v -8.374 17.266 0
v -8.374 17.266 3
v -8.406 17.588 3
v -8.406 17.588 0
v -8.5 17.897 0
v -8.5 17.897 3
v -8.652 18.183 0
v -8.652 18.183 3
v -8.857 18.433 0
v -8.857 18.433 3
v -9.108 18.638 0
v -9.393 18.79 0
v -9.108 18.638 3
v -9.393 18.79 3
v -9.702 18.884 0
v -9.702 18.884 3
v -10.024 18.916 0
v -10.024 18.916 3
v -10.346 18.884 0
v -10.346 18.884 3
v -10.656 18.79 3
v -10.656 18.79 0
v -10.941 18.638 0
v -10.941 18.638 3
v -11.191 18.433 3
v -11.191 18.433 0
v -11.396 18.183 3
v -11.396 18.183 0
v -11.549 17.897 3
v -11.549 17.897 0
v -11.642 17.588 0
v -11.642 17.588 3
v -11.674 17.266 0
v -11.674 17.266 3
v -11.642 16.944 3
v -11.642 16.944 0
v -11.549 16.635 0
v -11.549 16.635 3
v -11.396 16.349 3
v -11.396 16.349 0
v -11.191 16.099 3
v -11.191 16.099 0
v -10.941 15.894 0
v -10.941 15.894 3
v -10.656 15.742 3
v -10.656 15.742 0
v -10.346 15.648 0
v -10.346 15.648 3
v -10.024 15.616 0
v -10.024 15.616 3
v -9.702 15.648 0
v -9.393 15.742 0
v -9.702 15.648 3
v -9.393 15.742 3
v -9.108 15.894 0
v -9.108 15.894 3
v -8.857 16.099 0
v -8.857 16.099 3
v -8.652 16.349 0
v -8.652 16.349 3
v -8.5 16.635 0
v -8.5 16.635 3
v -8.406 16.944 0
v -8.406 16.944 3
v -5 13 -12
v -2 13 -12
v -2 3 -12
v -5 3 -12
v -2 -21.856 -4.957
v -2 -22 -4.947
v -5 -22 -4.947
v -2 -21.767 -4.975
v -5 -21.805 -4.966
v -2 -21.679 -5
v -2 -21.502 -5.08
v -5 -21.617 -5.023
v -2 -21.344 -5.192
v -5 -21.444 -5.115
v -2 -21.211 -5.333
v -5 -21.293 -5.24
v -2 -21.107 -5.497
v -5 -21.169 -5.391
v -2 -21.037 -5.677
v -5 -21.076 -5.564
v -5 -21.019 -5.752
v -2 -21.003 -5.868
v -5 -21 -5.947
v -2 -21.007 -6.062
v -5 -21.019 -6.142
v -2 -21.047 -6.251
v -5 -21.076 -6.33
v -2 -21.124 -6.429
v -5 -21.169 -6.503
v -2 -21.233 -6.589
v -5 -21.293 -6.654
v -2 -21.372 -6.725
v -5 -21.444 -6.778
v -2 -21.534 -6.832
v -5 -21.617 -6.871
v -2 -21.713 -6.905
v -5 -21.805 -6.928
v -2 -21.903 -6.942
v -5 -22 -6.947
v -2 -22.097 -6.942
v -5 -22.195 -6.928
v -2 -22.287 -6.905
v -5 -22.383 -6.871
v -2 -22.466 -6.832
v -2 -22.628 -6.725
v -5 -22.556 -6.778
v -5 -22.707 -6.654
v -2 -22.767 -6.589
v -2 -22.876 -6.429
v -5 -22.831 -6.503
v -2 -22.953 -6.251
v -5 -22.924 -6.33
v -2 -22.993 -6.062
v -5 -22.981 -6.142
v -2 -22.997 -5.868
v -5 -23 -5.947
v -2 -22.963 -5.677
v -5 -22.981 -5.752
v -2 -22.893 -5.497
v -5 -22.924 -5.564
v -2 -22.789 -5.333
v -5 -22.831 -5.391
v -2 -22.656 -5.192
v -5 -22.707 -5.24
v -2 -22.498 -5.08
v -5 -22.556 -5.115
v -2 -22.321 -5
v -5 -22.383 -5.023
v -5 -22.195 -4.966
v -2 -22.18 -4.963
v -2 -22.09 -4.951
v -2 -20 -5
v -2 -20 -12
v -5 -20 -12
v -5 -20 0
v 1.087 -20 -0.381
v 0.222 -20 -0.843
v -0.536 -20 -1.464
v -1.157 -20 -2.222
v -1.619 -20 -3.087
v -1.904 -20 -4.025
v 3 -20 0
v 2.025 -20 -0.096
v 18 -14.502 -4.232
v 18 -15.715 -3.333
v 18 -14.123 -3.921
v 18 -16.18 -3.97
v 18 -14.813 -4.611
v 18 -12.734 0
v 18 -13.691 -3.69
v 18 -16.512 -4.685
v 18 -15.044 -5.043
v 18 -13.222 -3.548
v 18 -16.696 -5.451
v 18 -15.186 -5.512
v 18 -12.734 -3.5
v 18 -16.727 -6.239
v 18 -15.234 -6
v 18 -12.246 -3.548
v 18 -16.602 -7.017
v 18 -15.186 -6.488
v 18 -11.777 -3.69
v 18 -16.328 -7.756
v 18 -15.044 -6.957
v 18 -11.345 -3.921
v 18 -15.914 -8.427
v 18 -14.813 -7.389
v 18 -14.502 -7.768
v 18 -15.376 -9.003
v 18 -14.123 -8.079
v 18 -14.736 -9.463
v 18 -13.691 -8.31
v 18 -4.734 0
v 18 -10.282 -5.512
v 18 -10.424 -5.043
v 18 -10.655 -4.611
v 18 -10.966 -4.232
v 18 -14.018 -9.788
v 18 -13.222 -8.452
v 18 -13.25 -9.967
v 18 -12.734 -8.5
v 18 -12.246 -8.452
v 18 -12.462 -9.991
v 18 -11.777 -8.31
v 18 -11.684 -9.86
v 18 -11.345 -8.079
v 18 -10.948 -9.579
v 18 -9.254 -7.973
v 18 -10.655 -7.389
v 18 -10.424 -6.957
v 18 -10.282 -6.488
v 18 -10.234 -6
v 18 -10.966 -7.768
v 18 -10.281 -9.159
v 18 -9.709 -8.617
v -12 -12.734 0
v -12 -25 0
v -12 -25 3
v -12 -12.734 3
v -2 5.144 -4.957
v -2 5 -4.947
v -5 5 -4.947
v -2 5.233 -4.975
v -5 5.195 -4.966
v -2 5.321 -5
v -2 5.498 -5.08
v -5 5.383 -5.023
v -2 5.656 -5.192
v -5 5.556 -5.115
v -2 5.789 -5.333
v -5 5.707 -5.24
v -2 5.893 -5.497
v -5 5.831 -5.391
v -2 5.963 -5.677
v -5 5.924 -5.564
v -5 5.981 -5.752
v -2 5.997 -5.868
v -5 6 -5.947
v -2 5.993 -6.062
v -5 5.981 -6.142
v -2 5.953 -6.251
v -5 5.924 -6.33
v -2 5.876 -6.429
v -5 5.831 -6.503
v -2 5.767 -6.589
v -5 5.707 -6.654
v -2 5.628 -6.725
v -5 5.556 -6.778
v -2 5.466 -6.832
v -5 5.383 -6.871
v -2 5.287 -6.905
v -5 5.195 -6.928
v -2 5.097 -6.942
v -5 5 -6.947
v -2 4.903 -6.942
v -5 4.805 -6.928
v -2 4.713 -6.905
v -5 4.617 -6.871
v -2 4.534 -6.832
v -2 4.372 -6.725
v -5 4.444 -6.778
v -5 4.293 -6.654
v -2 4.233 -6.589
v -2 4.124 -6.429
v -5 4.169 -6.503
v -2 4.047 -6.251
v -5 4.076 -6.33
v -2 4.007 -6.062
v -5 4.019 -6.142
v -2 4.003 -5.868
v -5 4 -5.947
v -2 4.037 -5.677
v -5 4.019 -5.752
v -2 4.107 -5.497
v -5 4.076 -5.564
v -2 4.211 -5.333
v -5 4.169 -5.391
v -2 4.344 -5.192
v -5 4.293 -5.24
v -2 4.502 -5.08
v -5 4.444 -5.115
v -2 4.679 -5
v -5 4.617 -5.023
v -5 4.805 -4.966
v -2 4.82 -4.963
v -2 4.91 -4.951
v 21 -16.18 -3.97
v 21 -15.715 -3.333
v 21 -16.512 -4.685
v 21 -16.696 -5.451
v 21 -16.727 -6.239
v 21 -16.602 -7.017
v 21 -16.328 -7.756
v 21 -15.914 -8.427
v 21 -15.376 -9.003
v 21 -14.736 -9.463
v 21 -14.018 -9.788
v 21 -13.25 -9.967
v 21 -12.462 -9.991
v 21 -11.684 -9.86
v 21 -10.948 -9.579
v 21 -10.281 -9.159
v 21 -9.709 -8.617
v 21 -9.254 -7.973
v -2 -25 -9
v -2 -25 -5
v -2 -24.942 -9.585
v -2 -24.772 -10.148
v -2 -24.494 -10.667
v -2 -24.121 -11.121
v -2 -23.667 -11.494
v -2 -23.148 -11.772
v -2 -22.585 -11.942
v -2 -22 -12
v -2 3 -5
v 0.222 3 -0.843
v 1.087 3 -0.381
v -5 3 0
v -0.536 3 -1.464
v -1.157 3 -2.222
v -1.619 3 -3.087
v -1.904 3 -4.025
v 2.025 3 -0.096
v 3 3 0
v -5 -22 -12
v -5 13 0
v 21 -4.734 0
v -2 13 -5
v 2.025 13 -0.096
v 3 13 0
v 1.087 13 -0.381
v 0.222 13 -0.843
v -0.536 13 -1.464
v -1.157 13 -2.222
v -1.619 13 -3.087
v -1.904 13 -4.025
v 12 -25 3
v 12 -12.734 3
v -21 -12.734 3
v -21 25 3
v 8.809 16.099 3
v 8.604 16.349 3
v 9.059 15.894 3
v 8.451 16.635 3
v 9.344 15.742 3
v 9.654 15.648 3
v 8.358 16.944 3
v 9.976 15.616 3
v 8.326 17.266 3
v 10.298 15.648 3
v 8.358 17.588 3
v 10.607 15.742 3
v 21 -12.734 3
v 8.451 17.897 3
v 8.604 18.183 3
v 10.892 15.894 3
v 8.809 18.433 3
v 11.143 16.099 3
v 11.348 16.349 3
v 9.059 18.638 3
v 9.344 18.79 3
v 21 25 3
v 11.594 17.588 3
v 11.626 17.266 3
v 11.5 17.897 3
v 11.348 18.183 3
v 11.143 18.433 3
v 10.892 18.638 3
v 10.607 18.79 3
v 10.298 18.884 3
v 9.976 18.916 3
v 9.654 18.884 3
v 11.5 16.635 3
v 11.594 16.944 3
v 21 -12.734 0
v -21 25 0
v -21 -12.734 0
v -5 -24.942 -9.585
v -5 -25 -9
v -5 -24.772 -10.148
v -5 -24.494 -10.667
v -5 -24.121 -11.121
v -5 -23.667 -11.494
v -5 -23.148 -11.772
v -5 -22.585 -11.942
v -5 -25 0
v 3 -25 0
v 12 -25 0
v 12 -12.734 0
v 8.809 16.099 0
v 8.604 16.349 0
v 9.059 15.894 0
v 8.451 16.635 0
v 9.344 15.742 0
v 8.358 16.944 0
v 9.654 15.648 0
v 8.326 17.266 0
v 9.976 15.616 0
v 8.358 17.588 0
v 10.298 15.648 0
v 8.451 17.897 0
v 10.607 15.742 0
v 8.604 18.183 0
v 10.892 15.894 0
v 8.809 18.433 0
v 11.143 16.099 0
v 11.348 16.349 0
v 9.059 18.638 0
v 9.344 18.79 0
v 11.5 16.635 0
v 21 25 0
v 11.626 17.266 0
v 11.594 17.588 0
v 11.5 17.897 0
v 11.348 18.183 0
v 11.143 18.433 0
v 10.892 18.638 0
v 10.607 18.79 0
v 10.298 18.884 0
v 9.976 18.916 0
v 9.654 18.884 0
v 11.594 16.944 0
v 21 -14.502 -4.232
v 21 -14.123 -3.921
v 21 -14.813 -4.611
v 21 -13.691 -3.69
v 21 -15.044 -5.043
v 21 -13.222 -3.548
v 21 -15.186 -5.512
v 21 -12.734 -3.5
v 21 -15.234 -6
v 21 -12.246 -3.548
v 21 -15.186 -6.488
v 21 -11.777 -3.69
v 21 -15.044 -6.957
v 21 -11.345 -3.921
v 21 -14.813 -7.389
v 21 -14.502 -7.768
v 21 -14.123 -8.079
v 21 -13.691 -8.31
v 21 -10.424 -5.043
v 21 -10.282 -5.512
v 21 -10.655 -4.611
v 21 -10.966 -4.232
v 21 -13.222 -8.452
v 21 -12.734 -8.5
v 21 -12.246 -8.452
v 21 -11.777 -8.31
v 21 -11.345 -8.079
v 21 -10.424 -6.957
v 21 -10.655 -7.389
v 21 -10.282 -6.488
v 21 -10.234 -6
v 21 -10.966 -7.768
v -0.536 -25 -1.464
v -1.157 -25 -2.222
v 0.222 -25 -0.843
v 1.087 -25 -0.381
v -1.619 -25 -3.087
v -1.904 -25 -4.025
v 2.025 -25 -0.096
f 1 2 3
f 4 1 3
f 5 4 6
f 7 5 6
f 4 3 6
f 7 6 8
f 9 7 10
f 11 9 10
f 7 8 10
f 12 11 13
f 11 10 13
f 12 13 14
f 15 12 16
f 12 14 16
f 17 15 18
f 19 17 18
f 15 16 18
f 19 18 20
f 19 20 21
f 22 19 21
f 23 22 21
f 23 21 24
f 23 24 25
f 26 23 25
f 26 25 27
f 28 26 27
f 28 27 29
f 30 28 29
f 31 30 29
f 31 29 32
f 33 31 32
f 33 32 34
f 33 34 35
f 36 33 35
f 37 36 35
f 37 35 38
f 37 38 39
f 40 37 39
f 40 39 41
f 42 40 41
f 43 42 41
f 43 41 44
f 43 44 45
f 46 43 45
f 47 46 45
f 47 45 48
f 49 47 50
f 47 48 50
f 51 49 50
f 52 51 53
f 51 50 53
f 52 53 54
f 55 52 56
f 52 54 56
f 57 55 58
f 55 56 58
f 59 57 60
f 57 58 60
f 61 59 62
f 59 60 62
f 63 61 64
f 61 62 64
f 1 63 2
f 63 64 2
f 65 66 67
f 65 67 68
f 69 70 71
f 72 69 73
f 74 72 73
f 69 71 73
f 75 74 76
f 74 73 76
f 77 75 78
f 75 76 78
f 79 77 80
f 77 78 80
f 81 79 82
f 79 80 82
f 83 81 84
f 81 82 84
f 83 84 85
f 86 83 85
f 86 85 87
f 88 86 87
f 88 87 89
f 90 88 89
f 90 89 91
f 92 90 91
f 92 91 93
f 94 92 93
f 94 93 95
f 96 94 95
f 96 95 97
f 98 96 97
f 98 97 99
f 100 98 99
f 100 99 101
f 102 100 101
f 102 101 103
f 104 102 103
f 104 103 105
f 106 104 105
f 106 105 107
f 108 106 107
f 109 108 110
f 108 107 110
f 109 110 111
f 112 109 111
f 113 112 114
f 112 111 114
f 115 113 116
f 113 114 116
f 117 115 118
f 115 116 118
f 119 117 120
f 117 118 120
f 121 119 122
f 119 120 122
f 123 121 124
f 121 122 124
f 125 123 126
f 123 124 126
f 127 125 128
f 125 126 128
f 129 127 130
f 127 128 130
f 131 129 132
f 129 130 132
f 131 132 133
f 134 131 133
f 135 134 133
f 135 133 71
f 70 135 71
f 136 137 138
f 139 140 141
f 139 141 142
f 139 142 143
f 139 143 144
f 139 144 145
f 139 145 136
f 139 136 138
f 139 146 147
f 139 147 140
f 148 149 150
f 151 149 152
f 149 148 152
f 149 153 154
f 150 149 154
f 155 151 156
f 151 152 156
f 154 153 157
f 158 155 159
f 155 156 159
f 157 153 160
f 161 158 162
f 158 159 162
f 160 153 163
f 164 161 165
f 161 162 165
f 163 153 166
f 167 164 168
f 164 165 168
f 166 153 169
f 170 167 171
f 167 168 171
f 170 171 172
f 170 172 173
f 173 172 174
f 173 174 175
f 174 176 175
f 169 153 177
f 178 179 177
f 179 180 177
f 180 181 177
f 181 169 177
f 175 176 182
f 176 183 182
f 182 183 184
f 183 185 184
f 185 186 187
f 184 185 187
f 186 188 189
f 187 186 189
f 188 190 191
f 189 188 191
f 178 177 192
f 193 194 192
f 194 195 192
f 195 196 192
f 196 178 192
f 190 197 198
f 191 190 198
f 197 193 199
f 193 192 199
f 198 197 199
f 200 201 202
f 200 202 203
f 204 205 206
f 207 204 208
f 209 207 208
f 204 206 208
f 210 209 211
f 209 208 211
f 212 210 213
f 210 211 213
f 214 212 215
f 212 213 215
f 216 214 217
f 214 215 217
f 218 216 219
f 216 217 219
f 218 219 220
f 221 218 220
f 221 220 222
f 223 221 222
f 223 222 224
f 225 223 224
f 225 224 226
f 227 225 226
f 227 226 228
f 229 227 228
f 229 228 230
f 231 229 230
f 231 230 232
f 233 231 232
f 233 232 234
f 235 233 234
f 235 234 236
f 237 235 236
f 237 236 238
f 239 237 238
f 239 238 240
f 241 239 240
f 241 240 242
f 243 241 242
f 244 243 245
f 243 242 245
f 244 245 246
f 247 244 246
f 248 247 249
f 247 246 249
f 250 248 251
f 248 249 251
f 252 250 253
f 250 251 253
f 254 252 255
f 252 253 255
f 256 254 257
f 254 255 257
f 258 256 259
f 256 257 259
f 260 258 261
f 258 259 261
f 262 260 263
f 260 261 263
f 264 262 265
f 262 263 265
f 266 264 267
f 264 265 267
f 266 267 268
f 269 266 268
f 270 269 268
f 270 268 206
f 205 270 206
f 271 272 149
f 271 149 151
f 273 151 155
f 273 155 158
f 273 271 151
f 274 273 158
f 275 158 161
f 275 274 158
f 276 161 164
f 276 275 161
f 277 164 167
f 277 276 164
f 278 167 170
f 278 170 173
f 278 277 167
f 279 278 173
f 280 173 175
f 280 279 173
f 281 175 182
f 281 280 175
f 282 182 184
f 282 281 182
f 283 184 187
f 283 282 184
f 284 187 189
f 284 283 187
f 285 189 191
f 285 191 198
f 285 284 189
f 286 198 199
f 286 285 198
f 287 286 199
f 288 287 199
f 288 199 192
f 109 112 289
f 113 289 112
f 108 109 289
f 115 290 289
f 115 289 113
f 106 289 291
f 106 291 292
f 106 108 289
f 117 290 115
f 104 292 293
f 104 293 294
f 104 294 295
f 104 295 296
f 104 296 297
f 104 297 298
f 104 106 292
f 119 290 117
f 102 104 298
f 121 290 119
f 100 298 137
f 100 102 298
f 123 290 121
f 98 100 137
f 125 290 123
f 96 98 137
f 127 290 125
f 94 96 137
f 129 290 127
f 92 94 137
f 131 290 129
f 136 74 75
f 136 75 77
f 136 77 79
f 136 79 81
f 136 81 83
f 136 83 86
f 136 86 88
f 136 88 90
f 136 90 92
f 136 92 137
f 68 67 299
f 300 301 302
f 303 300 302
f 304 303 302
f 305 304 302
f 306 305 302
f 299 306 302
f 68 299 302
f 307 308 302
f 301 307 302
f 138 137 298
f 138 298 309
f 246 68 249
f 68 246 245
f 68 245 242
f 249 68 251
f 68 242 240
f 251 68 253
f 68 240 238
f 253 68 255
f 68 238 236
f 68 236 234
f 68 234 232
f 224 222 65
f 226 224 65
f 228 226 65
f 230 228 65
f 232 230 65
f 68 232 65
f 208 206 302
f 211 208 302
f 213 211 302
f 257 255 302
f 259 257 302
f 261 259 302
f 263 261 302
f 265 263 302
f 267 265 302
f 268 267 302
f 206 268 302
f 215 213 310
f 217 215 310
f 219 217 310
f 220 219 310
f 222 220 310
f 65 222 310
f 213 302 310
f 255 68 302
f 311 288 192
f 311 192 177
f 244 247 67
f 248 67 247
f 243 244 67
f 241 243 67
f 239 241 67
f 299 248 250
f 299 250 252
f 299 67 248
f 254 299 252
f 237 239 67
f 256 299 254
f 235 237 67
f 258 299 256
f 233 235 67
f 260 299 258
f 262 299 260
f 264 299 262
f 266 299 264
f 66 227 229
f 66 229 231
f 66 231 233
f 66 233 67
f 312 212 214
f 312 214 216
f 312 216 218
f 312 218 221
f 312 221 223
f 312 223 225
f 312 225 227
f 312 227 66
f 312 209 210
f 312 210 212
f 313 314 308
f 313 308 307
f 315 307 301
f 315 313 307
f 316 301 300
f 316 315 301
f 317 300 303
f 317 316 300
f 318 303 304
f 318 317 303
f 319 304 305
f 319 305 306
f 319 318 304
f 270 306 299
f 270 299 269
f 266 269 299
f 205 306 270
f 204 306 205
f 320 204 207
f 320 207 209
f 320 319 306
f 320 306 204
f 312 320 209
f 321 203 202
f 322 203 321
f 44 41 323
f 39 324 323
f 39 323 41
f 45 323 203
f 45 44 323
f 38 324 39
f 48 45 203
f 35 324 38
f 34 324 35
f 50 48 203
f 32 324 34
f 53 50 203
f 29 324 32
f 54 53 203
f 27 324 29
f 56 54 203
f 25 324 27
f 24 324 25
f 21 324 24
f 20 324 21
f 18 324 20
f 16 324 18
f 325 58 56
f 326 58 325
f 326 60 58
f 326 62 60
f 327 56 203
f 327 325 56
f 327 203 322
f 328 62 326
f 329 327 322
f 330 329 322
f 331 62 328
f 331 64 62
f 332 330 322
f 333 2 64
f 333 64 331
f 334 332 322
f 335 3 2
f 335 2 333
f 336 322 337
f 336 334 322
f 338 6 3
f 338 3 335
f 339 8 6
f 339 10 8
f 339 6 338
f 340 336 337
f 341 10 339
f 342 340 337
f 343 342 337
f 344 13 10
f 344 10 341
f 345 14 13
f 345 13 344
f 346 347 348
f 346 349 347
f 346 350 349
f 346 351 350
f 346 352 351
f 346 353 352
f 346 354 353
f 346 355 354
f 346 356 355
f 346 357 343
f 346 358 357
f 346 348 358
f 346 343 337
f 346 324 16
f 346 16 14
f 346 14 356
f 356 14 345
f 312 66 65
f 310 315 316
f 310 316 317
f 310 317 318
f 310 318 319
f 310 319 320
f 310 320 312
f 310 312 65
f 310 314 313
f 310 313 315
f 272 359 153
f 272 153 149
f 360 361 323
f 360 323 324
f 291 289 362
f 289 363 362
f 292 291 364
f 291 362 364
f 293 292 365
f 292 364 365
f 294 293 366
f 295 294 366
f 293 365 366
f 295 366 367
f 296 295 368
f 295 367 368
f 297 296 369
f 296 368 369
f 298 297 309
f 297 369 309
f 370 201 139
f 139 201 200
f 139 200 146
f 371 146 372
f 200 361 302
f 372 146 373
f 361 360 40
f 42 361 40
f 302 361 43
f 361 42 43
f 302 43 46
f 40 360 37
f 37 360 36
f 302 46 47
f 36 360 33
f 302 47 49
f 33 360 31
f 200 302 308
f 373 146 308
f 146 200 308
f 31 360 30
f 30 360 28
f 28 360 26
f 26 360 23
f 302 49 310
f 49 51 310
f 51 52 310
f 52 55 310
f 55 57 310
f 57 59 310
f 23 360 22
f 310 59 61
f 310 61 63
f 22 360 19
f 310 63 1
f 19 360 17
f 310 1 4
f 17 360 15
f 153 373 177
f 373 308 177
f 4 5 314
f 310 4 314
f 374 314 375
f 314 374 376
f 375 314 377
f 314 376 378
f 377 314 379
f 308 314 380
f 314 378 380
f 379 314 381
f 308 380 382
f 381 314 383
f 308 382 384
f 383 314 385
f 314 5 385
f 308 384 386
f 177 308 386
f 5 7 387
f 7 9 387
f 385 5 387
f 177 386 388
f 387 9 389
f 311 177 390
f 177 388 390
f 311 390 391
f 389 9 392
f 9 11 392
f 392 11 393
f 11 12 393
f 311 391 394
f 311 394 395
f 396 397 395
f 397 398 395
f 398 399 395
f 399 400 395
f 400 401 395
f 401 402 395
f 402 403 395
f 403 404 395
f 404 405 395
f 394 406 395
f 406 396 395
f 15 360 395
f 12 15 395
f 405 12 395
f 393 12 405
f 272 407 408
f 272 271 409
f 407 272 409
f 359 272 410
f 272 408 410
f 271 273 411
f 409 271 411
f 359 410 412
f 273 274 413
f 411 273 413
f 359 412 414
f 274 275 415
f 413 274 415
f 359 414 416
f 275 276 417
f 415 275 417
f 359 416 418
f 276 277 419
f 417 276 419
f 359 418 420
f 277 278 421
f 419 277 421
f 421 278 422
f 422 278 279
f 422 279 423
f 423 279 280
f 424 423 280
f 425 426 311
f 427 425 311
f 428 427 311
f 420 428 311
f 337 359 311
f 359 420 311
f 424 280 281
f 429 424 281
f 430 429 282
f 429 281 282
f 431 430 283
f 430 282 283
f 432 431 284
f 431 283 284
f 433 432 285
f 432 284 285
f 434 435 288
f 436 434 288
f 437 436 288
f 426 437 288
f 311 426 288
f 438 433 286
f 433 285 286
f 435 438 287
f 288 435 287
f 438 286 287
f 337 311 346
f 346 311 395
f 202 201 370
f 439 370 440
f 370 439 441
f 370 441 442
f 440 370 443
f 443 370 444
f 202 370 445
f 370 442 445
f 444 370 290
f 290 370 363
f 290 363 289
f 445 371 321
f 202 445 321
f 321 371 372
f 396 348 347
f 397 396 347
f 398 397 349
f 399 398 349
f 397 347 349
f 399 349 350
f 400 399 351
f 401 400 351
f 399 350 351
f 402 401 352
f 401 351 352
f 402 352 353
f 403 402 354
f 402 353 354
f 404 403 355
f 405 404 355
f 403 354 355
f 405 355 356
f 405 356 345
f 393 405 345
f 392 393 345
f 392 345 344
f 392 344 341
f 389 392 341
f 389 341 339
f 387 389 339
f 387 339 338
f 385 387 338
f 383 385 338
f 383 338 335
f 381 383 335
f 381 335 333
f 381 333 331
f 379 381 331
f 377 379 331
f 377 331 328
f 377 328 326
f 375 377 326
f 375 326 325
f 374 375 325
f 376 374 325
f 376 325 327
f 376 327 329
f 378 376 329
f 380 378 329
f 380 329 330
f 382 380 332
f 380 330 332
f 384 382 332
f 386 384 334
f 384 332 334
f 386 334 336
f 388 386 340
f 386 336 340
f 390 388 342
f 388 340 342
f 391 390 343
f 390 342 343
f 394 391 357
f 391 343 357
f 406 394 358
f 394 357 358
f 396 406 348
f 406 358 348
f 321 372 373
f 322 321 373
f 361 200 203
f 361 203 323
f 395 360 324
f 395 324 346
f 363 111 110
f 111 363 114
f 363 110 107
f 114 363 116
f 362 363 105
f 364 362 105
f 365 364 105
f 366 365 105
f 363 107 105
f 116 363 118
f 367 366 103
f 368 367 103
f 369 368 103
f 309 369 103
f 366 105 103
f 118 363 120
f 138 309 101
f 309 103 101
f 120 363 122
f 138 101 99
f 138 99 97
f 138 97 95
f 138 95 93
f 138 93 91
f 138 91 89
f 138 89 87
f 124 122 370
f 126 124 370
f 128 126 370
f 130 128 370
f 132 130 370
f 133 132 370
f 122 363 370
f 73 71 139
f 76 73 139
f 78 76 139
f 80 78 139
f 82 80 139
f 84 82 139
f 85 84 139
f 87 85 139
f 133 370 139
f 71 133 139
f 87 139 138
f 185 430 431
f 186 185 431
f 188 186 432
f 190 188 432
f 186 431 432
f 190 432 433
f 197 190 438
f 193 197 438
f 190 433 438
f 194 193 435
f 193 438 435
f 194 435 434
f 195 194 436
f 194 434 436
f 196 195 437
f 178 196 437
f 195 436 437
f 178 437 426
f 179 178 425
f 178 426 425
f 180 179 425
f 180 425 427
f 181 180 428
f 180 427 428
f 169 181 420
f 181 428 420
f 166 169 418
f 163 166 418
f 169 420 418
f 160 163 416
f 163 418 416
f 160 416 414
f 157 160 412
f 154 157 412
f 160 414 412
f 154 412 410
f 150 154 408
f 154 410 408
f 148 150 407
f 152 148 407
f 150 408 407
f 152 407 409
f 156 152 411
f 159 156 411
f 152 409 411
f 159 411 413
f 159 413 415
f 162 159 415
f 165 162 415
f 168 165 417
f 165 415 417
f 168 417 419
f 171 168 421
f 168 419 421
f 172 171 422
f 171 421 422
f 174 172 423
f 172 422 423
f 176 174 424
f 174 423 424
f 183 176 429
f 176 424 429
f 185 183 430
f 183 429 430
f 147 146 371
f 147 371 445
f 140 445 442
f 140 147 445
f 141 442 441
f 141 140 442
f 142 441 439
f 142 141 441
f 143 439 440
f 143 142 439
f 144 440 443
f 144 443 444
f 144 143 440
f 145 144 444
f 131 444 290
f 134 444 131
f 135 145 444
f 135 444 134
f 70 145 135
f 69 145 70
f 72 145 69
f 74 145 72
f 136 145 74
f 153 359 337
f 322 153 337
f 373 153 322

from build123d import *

# Parameters (mm, degrees)
SKETCH_1_W          = 42
SKETCH_1_H          = 50
EXTRUDE_1_DEPTH     = 3
SKETCH_3_W          = 3
SKETCH_3_H          = 5
SKETCH_3_H_2        = 10
EXTRUDE_2_DEPTH     = 12
FILLET_1_R          = 5
FILLET_2_R          = 5
SKETCH_4_R          = 1
CUT_EXTRUDE_1_DEPTH = 27
SKETCH_5_R          = 2.5
EXTRUDE_3_DEPTH     = 3
SKETCH_6_W          = 9
SKETCH_6_H          = 12.266046359
CUT_EXTRUDE_2_DEPTH = 4
SKETCH_7_R          = 1.65
CUT_EXTRUDE_3_DEPTH = 16
FILLET_3_R          = 3


with BuildPart() as part:
    # 草图1 → 凸台-拉伸1 (new body)
    with BuildSketch(Plane.XY):
        Rectangle(SKETCH_1_W, SKETCH_1_H)
    extrude(amount=EXTRUDE_1_DEPTH)

    # 草图3 → 凸台-拉伸2 (add)
    with BuildSketch(Plane(origin=(0, 0, 0), x_dir=(-1, 0, 0), z_dir=(0, 0, -1))):
        with Locations((3.5, -22.5)):
            Rectangle(SKETCH_3_W, SKETCH_3_H)
        with Locations((3.5, 8)):
            Rectangle(SKETCH_3_W, SKETCH_3_H_2)
    extrude(amount=EXTRUDE_2_DEPTH)

    # 圆角1
    fillet_1_edges = [part.edges().sort_by_distance(p)[0] for p in [
        (-2, 8, 0),
    ]]
    fillet(fillet_1_edges, radius=FILLET_1_R)

    # 圆角2
    fillet_2_edges = [part.edges().sort_by_distance(p)[0] for p in [
        (-2, -22.5, 0),
    ]]
    fillet(fillet_2_edges, radius=FILLET_2_R)

    # 草图4 → 切除-拉伸1 (cut, through all)
    with BuildSketch(Plane.ZY.offset(5)):
        with Locations((-5.946968178, -22)):
            Circle(SKETCH_4_R)
        with Locations((-5.946968178, 5)):
            Circle(SKETCH_4_R)
    extrude(amount=-CUT_EXTRUDE_1_DEPTH, mode=Mode.SUBTRACT)

    # 草图5 → 凸台-拉伸3 (add)
    with BuildSketch(Plane(origin=(21, 0, 0), x_dir=(0, 0, -1), z_dir=(1, 0, 0))):
        with BuildLine():
            Line((0, -4.733953641), (0, -12.733953641))
            Line((0, -12.733953641), (3.333333333, -15.715377611))
            ThreePointArc((3.333333333, -15.715377611), (9.249103106, -15.067047939), (7.972848445, -9.254317307))
            Line((7.972848445, -9.254317307), (0, -4.733953641))
        make_face()
        with Locations((6, -12.733953641)):
            Circle(SKETCH_5_R, mode=Mode.SUBTRACT)
    extrude(amount=-EXTRUDE_3_DEPTH)

    # 草图6 → 切除-拉伸2 (cut, through all)
    with BuildSketch(Plane(origin=(0, 0, 0), x_dir=(-1, 0, 0), z_dir=(0, 0, -1))):
        with Locations((-16.5, -18.86697682)):
            Rectangle(SKETCH_6_W, SKETCH_6_H)
        with Locations((16.5, -18.86697682)):
            Rectangle(SKETCH_6_W, SKETCH_6_H)
    extrude(amount=-CUT_EXTRUDE_2_DEPTH, mode=Mode.SUBTRACT)

    # 草图7 → 切除-拉伸3 (cut, through all)
    with BuildSketch(Plane.XY.offset(3)):
        with Locations((9.975799492, 17.266046359)):
            Circle(SKETCH_7_R)
        with Locations((-10.024200508, 17.266046359)):
            Circle(SKETCH_7_R)
    extrude(amount=-CUT_EXTRUDE_3_DEPTH, mode=Mode.SUBTRACT)

    # 圆角3
    fillet_3_edges = [part.edges().sort_by_distance(p)[0] for p in [
        (-3.5, -25, -12),
    ]]
    fillet(fillet_3_edges, radius=FILLET_3_R)


solid = part.part
